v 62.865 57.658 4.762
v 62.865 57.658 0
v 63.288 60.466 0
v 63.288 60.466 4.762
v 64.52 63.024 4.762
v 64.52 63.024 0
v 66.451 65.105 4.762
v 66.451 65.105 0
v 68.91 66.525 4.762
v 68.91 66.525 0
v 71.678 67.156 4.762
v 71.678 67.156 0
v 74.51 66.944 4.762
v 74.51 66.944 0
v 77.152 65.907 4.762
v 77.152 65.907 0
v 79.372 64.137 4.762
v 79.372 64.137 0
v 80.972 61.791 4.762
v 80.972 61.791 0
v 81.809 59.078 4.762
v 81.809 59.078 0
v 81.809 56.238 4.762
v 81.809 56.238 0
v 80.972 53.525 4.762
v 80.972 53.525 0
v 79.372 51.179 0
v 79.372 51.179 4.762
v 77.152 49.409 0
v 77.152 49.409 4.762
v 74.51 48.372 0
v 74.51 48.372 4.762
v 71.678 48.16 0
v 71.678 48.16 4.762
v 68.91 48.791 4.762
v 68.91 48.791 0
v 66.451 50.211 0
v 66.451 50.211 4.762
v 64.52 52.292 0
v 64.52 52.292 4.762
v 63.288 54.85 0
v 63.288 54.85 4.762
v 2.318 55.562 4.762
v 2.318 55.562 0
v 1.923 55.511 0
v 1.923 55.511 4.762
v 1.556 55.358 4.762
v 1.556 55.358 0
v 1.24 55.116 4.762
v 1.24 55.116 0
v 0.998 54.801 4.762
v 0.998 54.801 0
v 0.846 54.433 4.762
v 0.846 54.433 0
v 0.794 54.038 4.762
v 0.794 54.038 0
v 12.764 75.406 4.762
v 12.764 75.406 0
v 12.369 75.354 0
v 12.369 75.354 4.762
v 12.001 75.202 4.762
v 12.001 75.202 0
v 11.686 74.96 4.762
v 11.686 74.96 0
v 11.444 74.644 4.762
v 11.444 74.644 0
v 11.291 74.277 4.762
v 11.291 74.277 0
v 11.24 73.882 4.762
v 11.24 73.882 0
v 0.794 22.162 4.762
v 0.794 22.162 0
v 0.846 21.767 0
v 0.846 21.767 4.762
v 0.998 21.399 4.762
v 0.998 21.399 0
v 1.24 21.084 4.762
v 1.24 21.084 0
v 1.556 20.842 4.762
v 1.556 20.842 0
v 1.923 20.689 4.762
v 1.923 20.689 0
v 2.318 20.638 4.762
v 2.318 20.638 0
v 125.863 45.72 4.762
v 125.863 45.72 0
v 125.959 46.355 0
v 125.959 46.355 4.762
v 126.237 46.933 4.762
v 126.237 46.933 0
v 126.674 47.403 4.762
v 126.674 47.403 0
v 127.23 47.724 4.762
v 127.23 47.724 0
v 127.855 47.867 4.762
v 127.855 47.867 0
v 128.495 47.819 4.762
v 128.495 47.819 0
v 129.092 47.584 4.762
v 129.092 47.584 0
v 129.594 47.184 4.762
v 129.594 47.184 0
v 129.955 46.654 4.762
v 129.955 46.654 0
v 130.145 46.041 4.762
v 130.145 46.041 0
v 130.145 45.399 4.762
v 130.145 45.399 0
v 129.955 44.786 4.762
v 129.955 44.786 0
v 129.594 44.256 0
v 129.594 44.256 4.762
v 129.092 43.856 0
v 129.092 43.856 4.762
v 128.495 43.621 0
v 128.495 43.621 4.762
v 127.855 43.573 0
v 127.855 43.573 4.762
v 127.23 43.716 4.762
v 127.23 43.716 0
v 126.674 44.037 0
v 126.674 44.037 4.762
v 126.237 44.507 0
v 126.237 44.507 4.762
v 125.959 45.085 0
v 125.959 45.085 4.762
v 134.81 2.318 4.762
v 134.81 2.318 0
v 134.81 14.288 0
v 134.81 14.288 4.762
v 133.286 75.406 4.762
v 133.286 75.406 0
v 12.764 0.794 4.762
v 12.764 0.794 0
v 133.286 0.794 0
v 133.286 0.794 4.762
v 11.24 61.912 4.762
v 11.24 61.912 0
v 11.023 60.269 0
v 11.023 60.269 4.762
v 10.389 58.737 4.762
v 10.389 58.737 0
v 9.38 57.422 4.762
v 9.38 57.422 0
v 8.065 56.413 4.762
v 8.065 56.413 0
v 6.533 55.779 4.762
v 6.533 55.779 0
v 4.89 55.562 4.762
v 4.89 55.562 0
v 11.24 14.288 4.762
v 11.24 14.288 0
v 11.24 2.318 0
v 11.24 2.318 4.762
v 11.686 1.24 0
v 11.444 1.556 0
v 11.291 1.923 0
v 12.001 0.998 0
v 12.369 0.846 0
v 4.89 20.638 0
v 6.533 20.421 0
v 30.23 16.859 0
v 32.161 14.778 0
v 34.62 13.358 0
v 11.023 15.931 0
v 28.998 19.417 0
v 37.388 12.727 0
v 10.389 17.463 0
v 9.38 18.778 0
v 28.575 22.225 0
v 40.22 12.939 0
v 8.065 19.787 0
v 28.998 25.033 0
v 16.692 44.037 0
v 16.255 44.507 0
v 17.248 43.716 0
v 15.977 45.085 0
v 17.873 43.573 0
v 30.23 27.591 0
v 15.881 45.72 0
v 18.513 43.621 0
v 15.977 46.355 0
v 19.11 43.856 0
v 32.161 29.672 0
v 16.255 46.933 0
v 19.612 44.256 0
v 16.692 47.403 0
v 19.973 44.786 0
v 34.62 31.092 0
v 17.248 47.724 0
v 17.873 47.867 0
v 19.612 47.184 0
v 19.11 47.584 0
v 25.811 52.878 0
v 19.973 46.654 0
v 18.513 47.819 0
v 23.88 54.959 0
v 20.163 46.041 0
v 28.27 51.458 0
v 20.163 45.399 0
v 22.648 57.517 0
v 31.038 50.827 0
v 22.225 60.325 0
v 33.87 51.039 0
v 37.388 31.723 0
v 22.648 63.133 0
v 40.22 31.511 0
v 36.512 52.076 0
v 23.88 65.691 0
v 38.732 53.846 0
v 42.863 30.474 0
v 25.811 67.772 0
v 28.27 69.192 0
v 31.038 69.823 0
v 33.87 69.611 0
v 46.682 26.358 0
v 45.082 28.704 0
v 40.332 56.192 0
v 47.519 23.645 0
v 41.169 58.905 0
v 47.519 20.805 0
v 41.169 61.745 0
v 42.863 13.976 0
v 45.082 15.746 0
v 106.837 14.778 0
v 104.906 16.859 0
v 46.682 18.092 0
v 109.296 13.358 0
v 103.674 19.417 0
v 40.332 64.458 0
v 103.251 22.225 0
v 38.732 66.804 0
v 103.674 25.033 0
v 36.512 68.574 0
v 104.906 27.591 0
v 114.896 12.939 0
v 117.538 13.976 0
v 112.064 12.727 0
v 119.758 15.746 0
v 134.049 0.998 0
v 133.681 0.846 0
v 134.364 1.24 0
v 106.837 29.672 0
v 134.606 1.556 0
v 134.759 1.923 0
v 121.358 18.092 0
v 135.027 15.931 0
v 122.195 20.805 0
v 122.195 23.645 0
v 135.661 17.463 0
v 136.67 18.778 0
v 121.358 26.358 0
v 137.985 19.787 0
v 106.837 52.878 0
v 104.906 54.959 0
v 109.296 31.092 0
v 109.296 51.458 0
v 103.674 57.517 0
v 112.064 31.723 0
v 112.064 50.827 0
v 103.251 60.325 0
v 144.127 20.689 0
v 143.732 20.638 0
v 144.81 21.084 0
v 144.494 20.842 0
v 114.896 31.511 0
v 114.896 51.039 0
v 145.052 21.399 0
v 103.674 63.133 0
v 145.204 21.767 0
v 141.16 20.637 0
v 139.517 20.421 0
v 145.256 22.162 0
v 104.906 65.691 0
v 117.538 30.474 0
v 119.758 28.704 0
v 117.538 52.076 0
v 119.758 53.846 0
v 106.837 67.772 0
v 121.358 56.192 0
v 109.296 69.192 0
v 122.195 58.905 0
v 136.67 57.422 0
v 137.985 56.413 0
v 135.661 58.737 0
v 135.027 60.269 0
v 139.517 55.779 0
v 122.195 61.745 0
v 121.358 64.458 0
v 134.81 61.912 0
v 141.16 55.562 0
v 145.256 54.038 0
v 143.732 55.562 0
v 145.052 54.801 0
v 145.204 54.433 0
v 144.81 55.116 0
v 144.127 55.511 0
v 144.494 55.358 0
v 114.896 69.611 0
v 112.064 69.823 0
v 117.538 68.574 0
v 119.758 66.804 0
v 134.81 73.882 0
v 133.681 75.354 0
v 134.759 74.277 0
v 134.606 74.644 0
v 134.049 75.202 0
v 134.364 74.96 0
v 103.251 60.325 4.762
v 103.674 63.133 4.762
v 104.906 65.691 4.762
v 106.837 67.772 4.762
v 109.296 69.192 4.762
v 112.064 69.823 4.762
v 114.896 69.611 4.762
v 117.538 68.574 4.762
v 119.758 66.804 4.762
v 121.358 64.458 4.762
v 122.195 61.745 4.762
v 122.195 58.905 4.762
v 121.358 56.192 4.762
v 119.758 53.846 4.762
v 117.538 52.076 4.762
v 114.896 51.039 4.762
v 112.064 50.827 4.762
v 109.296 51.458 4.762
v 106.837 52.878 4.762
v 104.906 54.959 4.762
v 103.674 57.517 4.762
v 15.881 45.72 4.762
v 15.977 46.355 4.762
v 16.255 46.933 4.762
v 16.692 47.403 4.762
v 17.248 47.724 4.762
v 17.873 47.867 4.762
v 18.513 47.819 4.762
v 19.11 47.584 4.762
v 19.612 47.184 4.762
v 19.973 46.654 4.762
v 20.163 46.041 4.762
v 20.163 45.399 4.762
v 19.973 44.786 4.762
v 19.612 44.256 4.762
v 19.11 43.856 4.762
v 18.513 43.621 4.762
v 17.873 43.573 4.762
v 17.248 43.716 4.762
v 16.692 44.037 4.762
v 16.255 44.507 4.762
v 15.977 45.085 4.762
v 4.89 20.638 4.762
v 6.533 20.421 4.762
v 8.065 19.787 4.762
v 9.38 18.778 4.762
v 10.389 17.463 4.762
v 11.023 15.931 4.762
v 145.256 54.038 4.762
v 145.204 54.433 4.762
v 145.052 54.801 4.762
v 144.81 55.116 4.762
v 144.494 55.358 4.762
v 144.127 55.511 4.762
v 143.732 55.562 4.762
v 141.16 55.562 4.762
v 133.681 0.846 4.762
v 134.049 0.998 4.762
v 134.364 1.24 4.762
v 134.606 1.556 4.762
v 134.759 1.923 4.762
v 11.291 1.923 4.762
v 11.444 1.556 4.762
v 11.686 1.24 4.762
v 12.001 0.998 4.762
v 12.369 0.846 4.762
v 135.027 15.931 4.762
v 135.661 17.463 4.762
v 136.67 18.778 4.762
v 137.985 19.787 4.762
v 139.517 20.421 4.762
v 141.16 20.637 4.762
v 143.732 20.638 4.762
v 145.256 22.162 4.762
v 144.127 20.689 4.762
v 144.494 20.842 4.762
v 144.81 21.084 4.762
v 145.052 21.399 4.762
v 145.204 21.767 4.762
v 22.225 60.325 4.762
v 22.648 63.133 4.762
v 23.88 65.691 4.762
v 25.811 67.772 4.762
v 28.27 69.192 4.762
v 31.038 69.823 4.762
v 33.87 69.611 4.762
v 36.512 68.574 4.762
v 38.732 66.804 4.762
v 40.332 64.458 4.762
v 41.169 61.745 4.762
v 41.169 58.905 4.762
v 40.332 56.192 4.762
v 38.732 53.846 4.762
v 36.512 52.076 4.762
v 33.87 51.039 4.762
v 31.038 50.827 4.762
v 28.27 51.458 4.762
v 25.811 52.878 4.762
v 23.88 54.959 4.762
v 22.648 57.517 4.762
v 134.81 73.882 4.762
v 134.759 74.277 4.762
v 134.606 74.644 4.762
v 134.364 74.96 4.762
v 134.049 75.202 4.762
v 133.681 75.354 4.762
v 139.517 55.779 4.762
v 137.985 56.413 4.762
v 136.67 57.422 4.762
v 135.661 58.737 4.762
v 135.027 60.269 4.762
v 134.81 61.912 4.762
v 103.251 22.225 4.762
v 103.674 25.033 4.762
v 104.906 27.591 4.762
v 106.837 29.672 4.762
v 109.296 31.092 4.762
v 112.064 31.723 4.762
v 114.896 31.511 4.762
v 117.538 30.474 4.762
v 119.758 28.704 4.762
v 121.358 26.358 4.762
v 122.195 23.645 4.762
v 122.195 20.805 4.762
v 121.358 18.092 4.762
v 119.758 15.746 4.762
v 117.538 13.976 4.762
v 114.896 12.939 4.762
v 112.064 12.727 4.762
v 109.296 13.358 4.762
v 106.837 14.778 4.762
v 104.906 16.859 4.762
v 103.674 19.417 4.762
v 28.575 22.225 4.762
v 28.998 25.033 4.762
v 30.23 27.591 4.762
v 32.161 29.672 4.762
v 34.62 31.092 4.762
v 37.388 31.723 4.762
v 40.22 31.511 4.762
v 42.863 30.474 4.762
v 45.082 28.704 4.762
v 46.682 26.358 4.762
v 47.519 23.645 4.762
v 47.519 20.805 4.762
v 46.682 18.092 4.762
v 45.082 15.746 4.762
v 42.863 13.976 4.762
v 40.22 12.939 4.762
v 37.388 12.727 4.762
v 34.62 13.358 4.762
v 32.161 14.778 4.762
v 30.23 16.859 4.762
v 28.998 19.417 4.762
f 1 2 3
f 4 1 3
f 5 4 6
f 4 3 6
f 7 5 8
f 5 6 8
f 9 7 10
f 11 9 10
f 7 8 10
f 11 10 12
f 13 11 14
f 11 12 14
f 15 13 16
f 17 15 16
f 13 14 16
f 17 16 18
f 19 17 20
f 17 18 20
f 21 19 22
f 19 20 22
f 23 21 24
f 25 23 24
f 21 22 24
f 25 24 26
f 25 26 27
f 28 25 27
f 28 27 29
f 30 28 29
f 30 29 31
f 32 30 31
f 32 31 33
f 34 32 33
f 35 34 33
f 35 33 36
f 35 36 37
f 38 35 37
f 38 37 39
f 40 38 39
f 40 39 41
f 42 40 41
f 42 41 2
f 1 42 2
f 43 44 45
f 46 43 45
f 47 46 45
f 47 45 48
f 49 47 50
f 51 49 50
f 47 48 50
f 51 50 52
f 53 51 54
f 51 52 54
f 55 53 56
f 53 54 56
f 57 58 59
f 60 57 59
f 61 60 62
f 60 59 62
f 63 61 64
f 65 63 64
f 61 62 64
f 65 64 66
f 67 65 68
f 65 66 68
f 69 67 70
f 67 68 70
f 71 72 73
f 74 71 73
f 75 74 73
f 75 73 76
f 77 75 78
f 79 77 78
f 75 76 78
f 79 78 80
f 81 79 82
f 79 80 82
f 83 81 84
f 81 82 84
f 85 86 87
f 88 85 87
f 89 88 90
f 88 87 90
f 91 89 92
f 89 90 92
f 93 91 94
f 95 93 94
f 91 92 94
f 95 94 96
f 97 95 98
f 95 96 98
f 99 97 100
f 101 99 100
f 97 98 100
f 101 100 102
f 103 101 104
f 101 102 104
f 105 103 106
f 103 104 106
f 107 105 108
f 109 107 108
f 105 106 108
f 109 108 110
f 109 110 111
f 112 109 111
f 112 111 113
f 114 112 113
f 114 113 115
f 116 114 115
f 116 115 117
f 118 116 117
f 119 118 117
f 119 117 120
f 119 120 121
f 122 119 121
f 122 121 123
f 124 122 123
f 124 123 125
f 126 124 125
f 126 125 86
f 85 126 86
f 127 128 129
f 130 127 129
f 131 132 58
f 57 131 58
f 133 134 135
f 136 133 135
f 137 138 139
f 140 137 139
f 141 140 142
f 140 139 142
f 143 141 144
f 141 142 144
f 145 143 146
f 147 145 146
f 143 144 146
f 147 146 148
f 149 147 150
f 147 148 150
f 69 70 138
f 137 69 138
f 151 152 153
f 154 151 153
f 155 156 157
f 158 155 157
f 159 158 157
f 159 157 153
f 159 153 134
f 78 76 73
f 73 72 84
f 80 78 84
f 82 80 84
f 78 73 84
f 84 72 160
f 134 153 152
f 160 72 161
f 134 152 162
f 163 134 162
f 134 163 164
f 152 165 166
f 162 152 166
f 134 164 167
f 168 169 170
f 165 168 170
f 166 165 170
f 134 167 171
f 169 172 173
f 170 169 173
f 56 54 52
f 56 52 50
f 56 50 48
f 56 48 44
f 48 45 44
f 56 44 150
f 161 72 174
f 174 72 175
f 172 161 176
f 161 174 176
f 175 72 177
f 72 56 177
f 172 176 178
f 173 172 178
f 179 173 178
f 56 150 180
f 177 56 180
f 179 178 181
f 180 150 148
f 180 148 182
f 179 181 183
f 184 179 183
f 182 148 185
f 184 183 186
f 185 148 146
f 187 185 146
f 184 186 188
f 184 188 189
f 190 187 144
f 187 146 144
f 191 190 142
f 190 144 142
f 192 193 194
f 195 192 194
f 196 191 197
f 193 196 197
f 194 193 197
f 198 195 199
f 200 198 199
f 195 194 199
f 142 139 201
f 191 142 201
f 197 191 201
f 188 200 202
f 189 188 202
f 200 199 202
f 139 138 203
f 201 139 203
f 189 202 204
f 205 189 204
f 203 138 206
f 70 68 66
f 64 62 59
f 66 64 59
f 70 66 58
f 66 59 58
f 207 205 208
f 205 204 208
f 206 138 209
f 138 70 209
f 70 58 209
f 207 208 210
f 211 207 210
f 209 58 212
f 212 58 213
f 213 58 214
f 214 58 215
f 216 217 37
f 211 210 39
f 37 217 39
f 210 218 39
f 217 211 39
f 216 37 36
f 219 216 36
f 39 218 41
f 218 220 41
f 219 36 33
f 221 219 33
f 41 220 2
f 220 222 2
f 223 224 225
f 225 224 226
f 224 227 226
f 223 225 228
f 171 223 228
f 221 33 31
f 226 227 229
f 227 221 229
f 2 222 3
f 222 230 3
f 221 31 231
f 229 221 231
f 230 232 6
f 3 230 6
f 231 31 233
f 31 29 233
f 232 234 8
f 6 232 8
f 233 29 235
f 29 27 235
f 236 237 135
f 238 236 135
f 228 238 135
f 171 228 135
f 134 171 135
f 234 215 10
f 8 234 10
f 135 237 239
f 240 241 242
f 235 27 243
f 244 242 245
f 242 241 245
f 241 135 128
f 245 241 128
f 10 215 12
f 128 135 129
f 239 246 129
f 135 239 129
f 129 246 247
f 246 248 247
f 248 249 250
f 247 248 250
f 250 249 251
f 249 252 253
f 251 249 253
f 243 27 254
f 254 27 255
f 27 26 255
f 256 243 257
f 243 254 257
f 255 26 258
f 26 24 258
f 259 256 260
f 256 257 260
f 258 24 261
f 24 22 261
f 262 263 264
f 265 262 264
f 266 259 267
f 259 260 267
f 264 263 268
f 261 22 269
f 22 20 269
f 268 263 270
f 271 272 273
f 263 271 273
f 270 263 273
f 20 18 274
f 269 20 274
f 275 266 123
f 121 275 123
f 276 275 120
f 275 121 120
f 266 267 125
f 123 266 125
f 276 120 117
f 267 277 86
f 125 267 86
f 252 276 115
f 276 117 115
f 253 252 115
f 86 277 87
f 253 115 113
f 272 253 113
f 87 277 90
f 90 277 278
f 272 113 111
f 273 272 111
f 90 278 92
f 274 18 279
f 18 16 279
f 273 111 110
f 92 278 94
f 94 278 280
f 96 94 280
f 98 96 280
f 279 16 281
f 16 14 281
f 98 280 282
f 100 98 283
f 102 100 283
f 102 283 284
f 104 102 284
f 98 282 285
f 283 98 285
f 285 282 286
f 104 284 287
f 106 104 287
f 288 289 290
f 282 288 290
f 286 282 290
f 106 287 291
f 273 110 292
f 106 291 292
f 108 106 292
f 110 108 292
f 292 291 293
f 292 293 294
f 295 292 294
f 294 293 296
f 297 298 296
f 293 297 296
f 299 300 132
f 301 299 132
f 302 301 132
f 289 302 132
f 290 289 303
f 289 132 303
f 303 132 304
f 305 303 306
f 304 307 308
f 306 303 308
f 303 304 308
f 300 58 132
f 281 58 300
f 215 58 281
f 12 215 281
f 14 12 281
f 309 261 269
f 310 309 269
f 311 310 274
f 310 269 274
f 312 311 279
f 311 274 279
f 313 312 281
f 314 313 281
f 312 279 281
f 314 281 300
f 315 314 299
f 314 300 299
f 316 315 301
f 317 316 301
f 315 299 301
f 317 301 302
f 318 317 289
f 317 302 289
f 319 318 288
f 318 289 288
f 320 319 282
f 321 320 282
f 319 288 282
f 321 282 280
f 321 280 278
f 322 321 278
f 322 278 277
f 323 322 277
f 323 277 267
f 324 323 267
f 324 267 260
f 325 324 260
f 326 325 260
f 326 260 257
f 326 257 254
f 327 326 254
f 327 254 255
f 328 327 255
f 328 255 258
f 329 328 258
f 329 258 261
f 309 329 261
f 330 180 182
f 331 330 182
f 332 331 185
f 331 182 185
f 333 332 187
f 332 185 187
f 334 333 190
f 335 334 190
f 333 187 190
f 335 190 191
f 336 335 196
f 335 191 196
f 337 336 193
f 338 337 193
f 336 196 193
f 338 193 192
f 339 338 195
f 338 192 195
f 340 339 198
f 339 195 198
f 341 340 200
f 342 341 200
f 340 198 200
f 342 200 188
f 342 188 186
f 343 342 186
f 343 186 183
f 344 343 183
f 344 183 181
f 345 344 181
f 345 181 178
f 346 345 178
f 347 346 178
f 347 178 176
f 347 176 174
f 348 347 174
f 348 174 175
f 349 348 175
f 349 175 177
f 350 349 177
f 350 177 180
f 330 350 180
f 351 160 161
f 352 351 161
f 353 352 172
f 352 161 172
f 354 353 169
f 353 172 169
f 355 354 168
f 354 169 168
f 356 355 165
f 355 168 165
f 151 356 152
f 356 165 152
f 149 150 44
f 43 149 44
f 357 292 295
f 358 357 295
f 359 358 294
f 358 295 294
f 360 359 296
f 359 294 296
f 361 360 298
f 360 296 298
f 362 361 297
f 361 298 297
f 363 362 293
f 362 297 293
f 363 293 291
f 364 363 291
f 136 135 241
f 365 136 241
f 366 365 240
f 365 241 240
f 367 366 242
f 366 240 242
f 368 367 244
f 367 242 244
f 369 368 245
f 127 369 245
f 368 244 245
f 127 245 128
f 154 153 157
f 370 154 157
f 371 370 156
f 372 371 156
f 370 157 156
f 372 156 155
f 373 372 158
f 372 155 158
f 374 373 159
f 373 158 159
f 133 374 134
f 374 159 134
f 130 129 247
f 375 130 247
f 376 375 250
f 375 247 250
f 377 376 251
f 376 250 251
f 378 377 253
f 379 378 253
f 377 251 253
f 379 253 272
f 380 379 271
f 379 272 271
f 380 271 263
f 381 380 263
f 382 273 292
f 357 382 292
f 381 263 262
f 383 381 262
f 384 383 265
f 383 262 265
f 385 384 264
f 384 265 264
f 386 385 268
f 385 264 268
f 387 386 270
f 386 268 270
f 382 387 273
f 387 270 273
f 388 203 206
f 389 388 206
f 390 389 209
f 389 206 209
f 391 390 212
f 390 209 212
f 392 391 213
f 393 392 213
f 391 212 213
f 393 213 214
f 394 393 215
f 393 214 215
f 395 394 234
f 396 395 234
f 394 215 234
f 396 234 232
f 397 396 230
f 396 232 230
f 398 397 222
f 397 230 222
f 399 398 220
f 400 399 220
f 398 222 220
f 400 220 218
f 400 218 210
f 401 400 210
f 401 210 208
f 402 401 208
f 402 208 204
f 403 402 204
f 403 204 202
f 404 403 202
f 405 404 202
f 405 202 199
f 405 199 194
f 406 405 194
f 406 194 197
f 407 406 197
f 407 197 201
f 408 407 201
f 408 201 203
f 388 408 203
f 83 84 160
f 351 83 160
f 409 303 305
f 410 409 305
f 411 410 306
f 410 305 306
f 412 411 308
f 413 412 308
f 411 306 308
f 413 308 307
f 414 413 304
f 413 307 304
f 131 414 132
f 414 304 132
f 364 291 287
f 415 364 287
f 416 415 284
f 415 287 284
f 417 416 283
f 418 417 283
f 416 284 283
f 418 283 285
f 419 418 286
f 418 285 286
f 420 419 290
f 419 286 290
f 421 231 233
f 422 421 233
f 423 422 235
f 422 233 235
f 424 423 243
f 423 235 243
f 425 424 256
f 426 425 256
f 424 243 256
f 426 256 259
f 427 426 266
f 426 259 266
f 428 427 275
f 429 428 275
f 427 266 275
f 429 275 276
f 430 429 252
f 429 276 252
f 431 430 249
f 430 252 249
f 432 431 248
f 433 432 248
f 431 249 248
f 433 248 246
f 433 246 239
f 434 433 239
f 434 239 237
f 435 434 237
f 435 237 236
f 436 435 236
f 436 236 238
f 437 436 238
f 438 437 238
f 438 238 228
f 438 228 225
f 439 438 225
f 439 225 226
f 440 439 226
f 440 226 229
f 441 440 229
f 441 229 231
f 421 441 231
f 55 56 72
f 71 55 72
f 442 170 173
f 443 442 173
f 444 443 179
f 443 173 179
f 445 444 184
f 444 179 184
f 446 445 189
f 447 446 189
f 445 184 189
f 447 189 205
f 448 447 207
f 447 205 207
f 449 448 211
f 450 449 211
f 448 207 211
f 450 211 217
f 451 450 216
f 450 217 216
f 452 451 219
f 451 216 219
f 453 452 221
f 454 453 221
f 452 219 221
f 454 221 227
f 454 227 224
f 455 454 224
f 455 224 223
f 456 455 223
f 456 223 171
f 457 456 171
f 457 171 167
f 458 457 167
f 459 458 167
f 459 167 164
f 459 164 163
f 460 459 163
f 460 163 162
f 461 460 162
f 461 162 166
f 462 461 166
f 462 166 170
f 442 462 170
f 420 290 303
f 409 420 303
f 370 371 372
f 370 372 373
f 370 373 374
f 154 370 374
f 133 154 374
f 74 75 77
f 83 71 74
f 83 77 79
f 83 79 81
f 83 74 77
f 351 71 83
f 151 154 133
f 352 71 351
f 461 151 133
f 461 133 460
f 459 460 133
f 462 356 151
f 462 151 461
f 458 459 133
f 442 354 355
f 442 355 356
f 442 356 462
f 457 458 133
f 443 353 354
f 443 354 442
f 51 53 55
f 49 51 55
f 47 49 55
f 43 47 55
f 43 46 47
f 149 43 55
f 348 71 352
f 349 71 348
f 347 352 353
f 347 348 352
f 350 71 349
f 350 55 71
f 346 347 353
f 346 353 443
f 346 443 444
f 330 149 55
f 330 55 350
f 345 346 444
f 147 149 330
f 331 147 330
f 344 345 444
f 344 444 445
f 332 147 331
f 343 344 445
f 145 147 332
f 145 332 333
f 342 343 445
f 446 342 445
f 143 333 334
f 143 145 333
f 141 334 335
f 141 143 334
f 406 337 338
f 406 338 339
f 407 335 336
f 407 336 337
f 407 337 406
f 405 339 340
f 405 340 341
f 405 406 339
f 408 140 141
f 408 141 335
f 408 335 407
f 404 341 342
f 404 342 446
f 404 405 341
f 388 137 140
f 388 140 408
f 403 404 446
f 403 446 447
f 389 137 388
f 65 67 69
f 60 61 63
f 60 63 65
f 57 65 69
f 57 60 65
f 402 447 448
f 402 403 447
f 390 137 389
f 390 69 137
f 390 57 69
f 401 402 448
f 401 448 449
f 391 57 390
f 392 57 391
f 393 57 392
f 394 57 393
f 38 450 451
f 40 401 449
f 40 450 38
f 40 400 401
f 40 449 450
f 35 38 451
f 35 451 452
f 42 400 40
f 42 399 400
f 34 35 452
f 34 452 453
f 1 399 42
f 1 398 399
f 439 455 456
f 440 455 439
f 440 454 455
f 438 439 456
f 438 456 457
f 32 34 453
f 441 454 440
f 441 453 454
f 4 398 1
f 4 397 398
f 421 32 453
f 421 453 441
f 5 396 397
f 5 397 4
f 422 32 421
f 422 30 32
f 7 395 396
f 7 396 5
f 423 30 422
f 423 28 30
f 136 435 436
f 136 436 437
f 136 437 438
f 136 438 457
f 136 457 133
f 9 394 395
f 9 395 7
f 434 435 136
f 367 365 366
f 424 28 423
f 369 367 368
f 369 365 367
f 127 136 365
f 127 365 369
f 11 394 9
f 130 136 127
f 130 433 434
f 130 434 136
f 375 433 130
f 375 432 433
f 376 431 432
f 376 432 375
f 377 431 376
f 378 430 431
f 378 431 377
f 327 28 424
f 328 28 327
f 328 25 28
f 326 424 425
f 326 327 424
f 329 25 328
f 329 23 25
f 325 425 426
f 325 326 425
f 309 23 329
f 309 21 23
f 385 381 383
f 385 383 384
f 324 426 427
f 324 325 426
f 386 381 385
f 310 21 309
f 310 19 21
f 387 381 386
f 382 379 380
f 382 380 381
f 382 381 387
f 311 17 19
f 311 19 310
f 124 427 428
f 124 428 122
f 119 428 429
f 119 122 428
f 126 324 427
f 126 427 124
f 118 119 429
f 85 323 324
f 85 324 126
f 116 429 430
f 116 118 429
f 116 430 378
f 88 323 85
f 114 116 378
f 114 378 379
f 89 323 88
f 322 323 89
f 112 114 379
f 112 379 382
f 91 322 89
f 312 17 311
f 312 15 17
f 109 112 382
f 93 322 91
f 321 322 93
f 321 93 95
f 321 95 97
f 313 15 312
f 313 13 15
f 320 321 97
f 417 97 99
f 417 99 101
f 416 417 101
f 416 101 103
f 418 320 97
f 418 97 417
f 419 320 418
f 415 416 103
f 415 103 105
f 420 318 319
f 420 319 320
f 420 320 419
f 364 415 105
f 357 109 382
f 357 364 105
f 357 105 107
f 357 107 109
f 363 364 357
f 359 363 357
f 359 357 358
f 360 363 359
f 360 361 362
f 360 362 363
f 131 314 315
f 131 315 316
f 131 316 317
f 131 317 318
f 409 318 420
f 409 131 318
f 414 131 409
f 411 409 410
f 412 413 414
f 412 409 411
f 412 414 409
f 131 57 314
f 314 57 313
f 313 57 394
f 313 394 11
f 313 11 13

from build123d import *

# Parameters (mm, degrees)
BOSS_EXTRUDE1_DEPTH         = 4.7625
F_3_4_0_75_DIAMETER_HOLE1_D = 19.05
F_6_CLEARANCE_HOLE1_D       = 4.3053


with BuildPart() as part:
    # Sketch1 → Boss-Extrude1 (new body)
    with BuildSketch(Plane.XY):
        with BuildLine():
            Line((134.8105, 61.9125), (134.8105, 73.88225))
            ThreePointArc((134.8105, 73.88225), (134.364130735, 74.959880735), (133.2865, 75.40625))
            Line((133.2865, 75.40625), (12.7635, 75.40625))
            ThreePointArc((12.7635, 75.40625), (11.685869265, 74.959880735), (11.2395, 73.88225))
            Line((11.2395, 73.88225), (11.2395, 61.9125))
            ThreePointArc((11.2395, 61.9125), (9.379628061, 57.422371939), (4.8895, 55.5625))
            Line((4.8895, 55.5625), (2.31775, 55.5625))
            ThreePointArc((2.31775, 55.5625), (1.240119265, 55.116130735), (0.79375, 54.0385))
            Line((0.79375, 54.0385), (0.79375, 22.1615))
            ThreePointArc((0.79375, 22.1615), (1.240119265, 21.083869265), (2.31775, 20.6375))
            Line((2.31775, 20.6375), (4.8895, 20.6375))
            ThreePointArc((4.8895, 20.6375), (9.379628061, 18.777628061), (11.2395, 14.2875))
            Line((11.2395, 14.2875), (11.2395, 2.31775))
            ThreePointArc((11.2395, 2.31775), (11.685869265, 1.240119265), (12.7635, 0.79375))
            Line((12.7635, 0.79375), (133.2865, 0.79375))
            ThreePointArc((133.2865, 0.79375), (134.364130735, 1.240119265), (134.8105, 2.31775))
            Line((134.8105, 2.31775), (134.8105, 14.2875))
            ThreePointArc((134.8105, 14.2875), (136.670371939, 18.777628061), (141.1605, 20.6375))
            Line((141.1605, 20.6375), (143.73225, 20.6375))
            ThreePointArc((143.73225, 20.6375), (144.809880735, 21.083869265), (145.25625, 22.1615))
            Line((145.25625, 22.1615), (145.25625, 54.0385))
            ThreePointArc((145.25625, 54.0385), (144.809880735, 55.116130735), (143.73225, 55.5625))
            Line((143.73225, 55.5625), (141.1605, 55.5625))
            ThreePointArc((141.1605, 55.5625), (136.670371939, 57.422371939), (134.8105, 61.9125))
        make_face()
    extrude(amount=BOSS_EXTRUDE1_DEPTH)

    # 3/4 (0.75) Diameter Hole1 (through all)
    with Locations(Plane.XY.offset(4.7625)):
        with Locations((31.75, 60.325), (72.39, 57.658), (112.776, 60.325), (112.776, 22.225), (38.1, 22.225)):
            Hole(F_3_4_0_75_DIAMETER_HOLE1_D / 2)

    # #6 Clearance Hole1 (through all)
    with Locations(Plane.XY.offset(4.7625)):
        with Locations((18.034, 45.72), (128.016, 45.72)):
            Hole(F_6_CLEARANCE_HOLE1_D / 2)


solid = part.part
